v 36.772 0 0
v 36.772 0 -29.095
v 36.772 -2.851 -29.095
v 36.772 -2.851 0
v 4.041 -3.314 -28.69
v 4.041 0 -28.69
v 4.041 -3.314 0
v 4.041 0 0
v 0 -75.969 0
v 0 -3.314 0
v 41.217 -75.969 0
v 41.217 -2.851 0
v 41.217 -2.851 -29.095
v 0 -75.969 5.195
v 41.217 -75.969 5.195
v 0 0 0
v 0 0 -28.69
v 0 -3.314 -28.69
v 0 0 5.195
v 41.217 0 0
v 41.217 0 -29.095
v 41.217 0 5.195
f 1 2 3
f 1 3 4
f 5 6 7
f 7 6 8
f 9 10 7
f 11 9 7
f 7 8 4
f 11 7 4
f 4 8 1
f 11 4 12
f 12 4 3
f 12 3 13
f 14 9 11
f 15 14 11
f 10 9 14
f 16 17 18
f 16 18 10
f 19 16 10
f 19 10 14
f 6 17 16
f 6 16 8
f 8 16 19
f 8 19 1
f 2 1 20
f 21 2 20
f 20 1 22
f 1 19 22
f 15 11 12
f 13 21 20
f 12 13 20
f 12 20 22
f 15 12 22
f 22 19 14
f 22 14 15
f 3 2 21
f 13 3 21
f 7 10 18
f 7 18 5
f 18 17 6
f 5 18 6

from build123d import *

# Parameters (mm, degrees)
F0_W     = 41.2172749639
F0_H     = 75.9690925479
F1_DEPTH = 5.19546
F2_W     = 4.0409080684
F2_H     = 28.6904554814
F3_DEPTH = 3.31435
F4_W     = 4.445001483
F4_H     = 29.0945470333
F5_DEPTH = 2.85121


with BuildPart() as f1:
    # F0 (on Top) → F1 (new body)
    with BuildSketch(Plane.XY):
        with Locations((20.6086374819, -37.9845462739)):
            Rectangle(F0_W, F0_H)
    extrude(amount=F1_DEPTH)

    # F2 (on Front) → F3 (join)
    with BuildSketch(Plane.XZ):
        with Locations((2.0204540342, -14.3452277407)):
            Rectangle(F2_W, F2_H)
    extrude(amount=F3_DEPTH)

    # F4 (on Front) → F5 (join)
    with BuildSketch(Plane.XZ):
        with Locations((38.9947742224, -14.5472735167)):
            Rectangle(F4_W, F4_H)
    extrude(amount=F5_DEPTH)


solid = f1.part
